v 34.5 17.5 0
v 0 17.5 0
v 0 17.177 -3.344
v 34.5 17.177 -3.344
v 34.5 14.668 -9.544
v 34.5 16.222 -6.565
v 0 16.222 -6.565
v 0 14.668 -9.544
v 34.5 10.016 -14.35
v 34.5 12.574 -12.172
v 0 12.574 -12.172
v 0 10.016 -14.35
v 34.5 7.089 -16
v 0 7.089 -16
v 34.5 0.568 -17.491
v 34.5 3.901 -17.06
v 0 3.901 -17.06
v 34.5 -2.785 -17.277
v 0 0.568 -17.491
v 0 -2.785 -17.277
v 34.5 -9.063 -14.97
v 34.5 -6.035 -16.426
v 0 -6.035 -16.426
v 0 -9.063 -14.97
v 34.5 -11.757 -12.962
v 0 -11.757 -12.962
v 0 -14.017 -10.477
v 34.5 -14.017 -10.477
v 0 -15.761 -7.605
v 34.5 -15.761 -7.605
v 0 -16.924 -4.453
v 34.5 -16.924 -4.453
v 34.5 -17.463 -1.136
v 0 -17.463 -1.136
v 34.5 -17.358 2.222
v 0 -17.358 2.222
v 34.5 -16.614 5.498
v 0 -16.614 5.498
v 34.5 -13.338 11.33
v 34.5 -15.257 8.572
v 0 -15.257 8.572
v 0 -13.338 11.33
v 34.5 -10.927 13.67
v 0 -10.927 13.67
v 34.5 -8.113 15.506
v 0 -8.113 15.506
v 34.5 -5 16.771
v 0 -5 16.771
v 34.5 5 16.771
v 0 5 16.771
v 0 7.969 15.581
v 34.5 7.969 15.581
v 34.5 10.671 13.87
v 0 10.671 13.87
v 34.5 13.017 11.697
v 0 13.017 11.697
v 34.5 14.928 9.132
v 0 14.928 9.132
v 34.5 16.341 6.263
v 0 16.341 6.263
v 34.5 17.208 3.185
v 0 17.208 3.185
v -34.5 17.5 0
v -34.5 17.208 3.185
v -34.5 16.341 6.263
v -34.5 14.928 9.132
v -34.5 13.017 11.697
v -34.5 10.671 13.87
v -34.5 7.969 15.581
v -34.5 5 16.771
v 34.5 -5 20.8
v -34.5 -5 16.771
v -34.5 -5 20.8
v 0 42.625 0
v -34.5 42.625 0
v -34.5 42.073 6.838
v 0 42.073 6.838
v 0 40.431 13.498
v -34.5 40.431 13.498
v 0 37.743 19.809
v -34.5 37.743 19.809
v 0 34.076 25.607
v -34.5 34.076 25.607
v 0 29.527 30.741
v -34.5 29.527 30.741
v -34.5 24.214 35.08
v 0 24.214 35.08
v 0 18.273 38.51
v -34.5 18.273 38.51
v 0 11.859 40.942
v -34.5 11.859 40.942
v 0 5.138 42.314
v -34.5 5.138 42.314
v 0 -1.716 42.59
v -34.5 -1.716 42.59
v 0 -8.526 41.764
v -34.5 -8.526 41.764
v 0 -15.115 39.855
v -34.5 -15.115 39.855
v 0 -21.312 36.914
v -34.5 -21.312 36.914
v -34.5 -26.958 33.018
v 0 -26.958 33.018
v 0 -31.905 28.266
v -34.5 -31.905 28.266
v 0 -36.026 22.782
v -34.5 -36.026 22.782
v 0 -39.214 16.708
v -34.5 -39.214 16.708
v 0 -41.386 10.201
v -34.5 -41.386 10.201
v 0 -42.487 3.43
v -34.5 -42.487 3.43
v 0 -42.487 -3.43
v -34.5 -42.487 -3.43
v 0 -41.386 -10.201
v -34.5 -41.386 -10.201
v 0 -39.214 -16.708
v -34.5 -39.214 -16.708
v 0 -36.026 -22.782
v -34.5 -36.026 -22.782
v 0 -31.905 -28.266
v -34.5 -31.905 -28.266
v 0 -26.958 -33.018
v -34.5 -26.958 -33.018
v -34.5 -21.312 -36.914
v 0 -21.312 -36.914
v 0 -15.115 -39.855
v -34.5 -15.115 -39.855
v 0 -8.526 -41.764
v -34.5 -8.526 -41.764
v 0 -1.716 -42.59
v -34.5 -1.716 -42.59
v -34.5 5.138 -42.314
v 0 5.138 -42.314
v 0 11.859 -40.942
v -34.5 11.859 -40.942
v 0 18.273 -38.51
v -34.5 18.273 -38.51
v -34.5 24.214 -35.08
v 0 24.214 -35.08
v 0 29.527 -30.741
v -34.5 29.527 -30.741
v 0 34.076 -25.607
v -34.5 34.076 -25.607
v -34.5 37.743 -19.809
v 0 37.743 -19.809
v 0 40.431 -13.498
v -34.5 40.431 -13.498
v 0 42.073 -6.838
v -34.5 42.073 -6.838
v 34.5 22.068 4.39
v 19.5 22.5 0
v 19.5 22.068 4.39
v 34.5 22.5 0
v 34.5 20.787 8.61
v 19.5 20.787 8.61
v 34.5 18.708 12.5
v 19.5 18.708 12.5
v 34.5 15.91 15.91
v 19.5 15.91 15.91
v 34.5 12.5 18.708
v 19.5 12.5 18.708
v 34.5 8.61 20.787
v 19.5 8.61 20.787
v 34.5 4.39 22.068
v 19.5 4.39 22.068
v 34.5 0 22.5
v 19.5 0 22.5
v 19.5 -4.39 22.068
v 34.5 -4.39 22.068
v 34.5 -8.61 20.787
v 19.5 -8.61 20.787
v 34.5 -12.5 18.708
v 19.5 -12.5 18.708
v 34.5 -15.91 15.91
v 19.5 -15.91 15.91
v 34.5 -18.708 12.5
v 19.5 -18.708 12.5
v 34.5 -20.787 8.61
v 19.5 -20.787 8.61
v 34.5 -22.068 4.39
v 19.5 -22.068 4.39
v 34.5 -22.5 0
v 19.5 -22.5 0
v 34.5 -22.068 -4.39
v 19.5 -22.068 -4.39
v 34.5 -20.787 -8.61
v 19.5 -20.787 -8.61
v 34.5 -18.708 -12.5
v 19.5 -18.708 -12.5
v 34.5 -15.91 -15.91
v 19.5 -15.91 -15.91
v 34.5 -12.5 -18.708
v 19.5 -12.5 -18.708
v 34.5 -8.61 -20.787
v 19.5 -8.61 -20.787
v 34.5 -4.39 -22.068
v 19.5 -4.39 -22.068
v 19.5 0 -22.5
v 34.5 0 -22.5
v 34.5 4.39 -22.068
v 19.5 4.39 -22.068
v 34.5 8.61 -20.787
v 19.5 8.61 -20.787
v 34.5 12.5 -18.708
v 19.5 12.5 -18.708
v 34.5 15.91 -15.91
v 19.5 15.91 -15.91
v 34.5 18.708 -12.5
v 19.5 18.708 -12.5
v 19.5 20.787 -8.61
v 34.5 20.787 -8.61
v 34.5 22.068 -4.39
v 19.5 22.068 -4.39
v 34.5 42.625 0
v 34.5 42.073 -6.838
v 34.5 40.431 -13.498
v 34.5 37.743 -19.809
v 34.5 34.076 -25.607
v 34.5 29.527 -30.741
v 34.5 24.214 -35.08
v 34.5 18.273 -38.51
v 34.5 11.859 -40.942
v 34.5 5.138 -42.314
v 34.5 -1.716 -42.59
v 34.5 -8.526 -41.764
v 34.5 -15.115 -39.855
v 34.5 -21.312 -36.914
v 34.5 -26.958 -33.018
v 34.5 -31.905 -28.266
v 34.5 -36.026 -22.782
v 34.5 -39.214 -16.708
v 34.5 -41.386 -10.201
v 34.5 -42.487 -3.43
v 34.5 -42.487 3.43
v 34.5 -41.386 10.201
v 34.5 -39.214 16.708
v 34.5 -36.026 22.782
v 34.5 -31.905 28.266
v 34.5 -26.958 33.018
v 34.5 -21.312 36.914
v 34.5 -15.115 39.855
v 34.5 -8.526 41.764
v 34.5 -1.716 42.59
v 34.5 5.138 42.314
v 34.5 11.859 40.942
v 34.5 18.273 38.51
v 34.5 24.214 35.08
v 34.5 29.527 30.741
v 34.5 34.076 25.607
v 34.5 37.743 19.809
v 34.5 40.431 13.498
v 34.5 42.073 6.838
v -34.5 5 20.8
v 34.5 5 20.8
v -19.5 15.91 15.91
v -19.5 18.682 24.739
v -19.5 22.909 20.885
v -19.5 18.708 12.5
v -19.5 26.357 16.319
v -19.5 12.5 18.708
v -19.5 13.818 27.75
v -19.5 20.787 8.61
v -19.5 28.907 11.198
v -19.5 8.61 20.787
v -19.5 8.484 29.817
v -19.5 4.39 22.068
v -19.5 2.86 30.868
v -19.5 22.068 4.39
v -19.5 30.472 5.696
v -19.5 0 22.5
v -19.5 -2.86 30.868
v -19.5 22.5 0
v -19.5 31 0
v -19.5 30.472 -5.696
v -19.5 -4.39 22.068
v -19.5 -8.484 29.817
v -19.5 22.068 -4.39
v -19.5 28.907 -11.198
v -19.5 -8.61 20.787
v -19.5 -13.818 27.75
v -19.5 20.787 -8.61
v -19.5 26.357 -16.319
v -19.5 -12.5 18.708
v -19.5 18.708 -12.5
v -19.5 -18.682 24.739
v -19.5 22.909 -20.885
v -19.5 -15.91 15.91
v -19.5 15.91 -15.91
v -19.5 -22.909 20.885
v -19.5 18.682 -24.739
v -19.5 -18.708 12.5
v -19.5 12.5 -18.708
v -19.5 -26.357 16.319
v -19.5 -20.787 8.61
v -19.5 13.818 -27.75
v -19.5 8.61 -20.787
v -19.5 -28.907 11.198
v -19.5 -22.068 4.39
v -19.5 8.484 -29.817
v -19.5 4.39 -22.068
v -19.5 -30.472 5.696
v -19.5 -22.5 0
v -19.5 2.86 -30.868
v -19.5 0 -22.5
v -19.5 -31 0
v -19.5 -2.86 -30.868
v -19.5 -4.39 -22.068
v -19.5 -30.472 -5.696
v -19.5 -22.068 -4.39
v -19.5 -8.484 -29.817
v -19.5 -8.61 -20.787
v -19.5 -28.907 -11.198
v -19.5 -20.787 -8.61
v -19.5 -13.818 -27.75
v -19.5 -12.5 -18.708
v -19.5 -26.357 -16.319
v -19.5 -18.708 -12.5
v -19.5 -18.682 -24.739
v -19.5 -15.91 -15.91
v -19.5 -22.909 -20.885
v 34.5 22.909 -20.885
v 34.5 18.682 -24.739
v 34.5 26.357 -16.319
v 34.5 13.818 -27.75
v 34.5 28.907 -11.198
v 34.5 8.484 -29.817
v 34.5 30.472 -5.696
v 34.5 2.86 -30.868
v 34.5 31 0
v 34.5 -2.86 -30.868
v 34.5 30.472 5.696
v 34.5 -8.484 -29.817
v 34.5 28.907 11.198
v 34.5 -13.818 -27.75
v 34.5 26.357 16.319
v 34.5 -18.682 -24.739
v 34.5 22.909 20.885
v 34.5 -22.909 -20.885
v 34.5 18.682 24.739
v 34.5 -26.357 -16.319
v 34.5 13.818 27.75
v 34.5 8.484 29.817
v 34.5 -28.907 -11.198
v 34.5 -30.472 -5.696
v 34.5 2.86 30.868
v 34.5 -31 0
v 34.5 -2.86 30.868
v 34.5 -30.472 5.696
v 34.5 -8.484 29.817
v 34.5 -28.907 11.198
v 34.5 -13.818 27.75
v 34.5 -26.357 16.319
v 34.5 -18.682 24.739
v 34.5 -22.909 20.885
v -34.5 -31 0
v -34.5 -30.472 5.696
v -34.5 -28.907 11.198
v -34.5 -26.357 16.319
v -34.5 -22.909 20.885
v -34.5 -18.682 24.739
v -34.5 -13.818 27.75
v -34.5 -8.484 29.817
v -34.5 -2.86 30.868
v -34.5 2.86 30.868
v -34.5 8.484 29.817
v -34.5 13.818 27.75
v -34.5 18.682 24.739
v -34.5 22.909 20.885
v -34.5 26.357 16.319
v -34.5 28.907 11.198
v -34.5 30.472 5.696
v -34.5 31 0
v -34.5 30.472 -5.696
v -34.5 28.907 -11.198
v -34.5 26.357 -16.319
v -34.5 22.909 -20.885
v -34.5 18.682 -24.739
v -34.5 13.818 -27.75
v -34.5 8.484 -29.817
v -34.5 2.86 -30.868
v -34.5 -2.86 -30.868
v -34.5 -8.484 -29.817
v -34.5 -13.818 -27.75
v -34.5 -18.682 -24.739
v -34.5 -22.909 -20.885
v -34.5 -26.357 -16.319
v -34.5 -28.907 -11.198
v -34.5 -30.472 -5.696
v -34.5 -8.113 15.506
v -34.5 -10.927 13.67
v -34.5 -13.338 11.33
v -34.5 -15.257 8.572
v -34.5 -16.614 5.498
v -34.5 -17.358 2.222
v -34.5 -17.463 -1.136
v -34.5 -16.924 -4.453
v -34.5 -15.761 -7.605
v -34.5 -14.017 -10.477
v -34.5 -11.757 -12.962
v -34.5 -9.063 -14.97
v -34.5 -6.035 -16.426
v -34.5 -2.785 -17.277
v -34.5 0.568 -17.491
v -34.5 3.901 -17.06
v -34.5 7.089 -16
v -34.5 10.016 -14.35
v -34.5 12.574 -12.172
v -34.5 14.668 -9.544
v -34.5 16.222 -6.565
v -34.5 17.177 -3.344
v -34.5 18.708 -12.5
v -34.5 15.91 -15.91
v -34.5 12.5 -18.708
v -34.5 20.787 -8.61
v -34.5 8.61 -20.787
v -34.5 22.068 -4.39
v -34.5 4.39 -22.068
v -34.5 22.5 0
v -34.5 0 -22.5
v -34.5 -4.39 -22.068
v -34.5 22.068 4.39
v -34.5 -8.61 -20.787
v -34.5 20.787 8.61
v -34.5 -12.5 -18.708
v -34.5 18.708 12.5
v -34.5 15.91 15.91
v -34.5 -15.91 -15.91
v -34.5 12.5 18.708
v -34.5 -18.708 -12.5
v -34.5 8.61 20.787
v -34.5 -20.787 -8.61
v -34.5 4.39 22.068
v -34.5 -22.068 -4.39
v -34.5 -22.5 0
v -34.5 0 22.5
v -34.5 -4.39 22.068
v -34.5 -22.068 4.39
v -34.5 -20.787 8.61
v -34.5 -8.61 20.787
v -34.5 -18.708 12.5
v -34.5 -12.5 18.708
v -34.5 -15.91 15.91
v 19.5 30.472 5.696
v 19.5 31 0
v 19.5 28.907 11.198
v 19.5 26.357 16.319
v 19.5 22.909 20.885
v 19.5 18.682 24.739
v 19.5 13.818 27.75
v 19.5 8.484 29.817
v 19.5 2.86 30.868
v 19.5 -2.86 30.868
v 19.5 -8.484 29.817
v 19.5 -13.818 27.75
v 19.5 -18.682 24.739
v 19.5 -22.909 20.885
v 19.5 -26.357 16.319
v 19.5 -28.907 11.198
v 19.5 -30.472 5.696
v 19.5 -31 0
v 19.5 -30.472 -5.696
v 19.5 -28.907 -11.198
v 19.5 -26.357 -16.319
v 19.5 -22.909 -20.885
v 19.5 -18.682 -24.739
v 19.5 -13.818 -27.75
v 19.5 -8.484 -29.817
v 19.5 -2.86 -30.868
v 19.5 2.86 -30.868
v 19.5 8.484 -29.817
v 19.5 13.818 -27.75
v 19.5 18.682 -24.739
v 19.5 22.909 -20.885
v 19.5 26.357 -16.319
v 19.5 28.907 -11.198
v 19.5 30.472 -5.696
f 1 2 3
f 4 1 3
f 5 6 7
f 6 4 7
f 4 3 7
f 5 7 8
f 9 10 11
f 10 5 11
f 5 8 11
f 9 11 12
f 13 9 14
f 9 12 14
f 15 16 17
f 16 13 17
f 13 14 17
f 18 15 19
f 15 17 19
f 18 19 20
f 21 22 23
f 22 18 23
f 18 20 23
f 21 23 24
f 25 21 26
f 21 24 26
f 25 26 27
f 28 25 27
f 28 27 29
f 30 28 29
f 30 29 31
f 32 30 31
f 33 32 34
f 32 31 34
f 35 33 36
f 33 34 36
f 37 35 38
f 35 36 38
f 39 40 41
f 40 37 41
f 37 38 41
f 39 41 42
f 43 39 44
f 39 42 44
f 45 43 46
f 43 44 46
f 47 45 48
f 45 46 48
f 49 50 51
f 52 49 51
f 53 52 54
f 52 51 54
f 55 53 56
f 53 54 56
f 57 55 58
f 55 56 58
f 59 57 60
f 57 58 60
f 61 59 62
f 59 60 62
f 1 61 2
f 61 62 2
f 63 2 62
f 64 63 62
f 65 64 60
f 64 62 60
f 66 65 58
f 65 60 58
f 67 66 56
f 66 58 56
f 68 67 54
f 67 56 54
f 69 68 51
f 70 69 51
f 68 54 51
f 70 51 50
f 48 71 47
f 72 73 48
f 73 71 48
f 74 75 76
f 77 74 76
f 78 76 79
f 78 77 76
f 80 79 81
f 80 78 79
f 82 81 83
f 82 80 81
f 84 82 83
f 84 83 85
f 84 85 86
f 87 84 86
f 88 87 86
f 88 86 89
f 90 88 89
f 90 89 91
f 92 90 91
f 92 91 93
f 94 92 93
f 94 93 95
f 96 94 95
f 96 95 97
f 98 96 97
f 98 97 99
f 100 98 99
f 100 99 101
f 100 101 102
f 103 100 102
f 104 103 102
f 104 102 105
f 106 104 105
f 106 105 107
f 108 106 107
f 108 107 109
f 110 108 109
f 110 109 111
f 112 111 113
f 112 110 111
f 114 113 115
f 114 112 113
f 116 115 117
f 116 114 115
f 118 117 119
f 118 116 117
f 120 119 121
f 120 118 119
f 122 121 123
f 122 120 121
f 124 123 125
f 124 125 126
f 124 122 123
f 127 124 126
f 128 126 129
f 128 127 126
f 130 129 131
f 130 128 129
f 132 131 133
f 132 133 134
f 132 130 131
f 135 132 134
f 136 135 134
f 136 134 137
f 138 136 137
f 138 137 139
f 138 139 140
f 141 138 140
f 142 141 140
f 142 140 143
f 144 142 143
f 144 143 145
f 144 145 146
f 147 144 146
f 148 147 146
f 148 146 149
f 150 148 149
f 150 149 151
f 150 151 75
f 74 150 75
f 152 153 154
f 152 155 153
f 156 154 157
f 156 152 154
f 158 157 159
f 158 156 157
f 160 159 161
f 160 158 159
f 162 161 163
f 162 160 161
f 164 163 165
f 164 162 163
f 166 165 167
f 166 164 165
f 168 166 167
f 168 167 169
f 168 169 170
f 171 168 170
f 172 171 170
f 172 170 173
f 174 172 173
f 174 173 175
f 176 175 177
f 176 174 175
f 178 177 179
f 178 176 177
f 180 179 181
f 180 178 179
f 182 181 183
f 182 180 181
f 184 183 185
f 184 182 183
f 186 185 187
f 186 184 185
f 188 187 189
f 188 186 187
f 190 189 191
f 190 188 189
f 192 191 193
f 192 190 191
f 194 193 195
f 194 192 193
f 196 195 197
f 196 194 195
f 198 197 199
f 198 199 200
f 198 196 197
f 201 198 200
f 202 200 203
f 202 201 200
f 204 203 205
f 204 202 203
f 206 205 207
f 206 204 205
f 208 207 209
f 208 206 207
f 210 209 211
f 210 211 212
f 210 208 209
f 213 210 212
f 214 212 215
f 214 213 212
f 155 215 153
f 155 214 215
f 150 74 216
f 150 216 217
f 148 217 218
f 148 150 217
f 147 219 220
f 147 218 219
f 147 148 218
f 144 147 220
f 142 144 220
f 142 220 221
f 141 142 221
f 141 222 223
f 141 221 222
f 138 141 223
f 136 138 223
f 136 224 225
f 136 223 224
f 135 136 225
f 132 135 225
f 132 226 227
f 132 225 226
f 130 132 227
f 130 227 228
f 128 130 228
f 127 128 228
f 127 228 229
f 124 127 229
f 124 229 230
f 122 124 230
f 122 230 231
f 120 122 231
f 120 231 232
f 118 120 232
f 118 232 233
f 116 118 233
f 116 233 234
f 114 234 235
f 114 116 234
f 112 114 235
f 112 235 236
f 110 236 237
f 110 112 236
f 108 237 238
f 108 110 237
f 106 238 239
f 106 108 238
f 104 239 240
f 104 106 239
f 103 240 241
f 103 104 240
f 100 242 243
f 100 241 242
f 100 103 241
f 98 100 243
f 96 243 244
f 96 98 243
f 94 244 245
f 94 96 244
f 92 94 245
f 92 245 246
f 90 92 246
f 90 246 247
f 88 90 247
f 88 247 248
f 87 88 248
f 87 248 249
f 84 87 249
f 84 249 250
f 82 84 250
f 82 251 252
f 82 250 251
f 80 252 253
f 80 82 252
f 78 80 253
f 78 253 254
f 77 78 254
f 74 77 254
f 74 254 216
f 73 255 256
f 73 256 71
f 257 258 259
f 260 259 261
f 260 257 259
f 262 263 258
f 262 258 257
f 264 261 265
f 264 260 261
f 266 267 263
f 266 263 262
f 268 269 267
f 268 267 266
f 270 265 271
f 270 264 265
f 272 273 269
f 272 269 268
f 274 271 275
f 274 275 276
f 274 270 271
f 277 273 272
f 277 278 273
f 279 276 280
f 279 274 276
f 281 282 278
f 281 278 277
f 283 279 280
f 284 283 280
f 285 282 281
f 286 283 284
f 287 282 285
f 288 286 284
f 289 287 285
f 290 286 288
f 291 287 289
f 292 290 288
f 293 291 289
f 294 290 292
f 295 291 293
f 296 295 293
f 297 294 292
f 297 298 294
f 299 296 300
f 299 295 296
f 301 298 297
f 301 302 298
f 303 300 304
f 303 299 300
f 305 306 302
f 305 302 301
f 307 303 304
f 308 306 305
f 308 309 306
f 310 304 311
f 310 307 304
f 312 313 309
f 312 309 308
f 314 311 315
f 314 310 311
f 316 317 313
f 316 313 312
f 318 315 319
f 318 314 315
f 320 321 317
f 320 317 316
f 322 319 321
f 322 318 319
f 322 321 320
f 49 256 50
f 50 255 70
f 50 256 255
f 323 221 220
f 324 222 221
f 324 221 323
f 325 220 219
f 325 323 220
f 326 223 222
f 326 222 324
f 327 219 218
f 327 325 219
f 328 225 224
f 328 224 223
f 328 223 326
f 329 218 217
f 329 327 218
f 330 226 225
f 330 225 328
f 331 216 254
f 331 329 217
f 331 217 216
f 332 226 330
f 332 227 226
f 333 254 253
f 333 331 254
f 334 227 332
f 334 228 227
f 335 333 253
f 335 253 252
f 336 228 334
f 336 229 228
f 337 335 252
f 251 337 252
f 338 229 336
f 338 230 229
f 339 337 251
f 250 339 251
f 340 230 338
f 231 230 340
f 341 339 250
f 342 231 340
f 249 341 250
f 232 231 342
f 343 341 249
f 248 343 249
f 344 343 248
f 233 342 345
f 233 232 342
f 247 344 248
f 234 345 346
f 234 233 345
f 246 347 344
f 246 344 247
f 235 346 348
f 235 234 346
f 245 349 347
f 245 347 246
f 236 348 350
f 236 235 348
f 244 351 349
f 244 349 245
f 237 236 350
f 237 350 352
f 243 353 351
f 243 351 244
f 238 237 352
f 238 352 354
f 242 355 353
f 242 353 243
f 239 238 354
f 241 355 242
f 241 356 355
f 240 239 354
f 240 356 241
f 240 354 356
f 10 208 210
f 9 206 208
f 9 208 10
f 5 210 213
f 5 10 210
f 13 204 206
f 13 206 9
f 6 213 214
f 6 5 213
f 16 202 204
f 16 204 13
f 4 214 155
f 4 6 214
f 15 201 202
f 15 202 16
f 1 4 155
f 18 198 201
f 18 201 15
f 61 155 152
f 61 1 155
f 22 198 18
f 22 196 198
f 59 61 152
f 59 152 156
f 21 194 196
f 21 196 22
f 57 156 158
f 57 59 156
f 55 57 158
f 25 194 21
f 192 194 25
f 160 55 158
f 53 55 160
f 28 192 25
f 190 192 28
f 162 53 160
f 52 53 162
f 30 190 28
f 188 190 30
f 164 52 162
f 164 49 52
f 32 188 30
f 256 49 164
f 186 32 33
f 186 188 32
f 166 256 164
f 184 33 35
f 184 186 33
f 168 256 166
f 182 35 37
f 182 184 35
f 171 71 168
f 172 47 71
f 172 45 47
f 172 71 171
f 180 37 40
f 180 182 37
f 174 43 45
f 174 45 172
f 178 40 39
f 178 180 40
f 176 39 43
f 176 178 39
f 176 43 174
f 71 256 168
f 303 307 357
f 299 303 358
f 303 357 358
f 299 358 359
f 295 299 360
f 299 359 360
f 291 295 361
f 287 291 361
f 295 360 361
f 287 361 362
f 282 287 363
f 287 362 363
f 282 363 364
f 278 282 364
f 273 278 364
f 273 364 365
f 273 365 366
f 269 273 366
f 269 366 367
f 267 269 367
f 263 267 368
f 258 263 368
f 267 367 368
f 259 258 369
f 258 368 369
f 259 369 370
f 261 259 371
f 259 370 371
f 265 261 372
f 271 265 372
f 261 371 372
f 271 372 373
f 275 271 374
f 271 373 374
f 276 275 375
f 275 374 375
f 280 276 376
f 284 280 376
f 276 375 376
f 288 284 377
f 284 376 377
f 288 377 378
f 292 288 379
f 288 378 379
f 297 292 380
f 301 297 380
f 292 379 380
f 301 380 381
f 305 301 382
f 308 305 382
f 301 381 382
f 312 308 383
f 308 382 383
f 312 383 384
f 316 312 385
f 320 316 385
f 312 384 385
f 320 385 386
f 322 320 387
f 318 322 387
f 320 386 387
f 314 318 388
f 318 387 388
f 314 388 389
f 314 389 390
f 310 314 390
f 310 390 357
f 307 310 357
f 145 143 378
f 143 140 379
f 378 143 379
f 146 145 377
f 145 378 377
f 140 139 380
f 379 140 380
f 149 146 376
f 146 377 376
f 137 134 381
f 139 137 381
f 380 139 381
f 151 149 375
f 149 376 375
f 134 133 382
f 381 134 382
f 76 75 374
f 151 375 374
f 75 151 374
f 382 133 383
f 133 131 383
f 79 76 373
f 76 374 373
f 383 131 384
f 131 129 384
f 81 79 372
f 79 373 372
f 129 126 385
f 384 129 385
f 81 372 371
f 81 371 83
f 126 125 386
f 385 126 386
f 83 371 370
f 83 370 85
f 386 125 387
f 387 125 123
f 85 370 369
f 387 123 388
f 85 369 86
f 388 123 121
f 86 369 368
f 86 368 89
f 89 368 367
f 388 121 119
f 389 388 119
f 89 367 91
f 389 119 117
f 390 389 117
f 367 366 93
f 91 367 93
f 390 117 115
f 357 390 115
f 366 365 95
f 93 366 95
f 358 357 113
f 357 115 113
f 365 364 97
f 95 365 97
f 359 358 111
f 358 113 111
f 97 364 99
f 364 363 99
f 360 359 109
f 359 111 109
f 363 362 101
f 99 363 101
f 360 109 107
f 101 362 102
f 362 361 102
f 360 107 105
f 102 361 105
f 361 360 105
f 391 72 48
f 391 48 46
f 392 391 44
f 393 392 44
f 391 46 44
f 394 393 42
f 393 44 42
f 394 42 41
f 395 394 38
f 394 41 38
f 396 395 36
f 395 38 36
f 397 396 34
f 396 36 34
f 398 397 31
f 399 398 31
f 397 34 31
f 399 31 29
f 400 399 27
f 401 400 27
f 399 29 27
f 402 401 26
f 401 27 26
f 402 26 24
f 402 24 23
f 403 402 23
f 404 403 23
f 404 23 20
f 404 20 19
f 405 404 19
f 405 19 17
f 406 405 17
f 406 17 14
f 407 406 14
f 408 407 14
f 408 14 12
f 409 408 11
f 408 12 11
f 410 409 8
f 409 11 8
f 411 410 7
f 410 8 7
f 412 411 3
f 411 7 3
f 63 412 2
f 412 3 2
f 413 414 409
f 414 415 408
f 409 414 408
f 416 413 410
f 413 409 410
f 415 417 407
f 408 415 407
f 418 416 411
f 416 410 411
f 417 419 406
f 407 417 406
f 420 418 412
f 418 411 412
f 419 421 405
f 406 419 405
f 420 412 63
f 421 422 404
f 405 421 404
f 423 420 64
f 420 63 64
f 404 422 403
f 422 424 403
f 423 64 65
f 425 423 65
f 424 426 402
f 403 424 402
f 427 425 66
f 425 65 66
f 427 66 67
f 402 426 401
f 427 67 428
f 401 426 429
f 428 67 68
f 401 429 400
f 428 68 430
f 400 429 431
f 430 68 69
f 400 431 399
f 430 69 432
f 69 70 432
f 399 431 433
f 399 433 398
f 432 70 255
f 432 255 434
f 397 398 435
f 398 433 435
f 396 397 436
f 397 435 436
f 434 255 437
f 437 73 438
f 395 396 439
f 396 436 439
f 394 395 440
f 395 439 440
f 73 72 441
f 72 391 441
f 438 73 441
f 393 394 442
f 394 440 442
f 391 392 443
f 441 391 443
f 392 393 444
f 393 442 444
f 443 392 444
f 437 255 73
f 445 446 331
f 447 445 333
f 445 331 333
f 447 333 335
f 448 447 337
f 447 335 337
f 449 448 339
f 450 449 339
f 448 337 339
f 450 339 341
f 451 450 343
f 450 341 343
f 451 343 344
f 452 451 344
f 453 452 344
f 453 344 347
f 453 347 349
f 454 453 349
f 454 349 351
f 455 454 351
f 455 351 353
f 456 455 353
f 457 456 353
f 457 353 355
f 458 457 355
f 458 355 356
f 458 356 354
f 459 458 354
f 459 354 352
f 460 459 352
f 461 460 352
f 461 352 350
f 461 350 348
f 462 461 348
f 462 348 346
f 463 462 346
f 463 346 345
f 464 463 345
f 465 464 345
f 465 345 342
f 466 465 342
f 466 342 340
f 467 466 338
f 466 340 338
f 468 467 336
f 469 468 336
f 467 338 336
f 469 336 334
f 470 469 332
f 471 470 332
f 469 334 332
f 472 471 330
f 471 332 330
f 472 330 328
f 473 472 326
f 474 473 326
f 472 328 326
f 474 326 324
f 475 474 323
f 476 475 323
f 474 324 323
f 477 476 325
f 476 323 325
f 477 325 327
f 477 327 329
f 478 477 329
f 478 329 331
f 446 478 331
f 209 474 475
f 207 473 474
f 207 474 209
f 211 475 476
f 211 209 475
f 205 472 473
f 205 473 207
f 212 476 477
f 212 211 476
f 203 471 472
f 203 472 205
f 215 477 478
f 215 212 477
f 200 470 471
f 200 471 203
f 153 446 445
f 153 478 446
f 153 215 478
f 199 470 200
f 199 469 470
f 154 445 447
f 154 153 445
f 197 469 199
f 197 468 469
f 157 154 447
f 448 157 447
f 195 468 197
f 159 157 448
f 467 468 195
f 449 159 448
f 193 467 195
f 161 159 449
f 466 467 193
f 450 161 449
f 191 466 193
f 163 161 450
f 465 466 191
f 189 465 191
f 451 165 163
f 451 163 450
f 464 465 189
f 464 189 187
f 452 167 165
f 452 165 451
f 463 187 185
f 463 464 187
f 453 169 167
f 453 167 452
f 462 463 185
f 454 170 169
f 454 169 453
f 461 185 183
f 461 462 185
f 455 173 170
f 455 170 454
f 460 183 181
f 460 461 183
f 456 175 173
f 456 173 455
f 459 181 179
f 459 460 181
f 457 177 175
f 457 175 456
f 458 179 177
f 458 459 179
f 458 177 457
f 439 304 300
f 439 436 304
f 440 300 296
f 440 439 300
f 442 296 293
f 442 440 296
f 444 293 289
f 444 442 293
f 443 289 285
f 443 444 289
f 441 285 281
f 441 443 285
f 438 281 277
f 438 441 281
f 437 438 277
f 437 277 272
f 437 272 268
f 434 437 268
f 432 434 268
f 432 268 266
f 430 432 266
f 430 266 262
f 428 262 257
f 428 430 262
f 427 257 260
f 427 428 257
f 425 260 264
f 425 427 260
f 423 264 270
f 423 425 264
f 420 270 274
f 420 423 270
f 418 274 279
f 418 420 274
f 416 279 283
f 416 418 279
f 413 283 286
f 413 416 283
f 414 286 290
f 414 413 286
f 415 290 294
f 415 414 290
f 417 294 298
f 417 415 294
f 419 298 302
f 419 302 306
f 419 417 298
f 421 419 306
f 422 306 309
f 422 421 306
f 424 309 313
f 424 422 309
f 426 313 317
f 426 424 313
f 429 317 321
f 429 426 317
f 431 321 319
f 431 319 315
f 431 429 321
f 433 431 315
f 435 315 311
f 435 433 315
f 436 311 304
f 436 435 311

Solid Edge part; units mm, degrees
sketch "Sketch1" plane through (0, 0, 0) normal (1, 0, 0) x (0, 1, 0)
  circle A0 centre (0, 0) radius 17.5
  circle A1 centre (0, 0) radius 42.625
extrude "Protrusion1" add sketch "Sketch1" along normal mid plane 69
sketch "Sketch2" plane through (-34.5, 0, 0) normal (-1, 0, 0) x (0, -1, 0)
  circle A0 centre (0, 0) radius 22.5
  circle A1 centre (0, 0) radius 31
extrude "VaciadoExtruido_1" cut sketch "Sketch2" against normal blind 15
sketch "Sketch3" plane through (34.5, 0, 0) normal (1, 0, 0) x (0, 1, 0)
  circle A0 centre (0, 0) radius 22.5
  circle A1 centre (0, 0) radius 31
extrude "Cutout1" cut sketch "Sketch3" against normal blind 15
sketch "Sketch4" plane through (34.5, 0, 0) normal (1, 0, 0) x (0, 1, 0)
  line L0 (-5, 20.8) -> (-5, 16.7705)
  line L1 (0, 20.8) -> (-5, 20.8)
  line L2 (0, 20.8) -> (5, 20.8)
  line L3 (5, 20.8) -> (5, 16.7705)
  arc A0 (-5, 16.7705) -> (5, 16.7705) centre (0, 0) cw
extrude "VaciadoExtruido_36" cut sketch "Sketch4" along normal mid plane 264
properties material "Acero"
